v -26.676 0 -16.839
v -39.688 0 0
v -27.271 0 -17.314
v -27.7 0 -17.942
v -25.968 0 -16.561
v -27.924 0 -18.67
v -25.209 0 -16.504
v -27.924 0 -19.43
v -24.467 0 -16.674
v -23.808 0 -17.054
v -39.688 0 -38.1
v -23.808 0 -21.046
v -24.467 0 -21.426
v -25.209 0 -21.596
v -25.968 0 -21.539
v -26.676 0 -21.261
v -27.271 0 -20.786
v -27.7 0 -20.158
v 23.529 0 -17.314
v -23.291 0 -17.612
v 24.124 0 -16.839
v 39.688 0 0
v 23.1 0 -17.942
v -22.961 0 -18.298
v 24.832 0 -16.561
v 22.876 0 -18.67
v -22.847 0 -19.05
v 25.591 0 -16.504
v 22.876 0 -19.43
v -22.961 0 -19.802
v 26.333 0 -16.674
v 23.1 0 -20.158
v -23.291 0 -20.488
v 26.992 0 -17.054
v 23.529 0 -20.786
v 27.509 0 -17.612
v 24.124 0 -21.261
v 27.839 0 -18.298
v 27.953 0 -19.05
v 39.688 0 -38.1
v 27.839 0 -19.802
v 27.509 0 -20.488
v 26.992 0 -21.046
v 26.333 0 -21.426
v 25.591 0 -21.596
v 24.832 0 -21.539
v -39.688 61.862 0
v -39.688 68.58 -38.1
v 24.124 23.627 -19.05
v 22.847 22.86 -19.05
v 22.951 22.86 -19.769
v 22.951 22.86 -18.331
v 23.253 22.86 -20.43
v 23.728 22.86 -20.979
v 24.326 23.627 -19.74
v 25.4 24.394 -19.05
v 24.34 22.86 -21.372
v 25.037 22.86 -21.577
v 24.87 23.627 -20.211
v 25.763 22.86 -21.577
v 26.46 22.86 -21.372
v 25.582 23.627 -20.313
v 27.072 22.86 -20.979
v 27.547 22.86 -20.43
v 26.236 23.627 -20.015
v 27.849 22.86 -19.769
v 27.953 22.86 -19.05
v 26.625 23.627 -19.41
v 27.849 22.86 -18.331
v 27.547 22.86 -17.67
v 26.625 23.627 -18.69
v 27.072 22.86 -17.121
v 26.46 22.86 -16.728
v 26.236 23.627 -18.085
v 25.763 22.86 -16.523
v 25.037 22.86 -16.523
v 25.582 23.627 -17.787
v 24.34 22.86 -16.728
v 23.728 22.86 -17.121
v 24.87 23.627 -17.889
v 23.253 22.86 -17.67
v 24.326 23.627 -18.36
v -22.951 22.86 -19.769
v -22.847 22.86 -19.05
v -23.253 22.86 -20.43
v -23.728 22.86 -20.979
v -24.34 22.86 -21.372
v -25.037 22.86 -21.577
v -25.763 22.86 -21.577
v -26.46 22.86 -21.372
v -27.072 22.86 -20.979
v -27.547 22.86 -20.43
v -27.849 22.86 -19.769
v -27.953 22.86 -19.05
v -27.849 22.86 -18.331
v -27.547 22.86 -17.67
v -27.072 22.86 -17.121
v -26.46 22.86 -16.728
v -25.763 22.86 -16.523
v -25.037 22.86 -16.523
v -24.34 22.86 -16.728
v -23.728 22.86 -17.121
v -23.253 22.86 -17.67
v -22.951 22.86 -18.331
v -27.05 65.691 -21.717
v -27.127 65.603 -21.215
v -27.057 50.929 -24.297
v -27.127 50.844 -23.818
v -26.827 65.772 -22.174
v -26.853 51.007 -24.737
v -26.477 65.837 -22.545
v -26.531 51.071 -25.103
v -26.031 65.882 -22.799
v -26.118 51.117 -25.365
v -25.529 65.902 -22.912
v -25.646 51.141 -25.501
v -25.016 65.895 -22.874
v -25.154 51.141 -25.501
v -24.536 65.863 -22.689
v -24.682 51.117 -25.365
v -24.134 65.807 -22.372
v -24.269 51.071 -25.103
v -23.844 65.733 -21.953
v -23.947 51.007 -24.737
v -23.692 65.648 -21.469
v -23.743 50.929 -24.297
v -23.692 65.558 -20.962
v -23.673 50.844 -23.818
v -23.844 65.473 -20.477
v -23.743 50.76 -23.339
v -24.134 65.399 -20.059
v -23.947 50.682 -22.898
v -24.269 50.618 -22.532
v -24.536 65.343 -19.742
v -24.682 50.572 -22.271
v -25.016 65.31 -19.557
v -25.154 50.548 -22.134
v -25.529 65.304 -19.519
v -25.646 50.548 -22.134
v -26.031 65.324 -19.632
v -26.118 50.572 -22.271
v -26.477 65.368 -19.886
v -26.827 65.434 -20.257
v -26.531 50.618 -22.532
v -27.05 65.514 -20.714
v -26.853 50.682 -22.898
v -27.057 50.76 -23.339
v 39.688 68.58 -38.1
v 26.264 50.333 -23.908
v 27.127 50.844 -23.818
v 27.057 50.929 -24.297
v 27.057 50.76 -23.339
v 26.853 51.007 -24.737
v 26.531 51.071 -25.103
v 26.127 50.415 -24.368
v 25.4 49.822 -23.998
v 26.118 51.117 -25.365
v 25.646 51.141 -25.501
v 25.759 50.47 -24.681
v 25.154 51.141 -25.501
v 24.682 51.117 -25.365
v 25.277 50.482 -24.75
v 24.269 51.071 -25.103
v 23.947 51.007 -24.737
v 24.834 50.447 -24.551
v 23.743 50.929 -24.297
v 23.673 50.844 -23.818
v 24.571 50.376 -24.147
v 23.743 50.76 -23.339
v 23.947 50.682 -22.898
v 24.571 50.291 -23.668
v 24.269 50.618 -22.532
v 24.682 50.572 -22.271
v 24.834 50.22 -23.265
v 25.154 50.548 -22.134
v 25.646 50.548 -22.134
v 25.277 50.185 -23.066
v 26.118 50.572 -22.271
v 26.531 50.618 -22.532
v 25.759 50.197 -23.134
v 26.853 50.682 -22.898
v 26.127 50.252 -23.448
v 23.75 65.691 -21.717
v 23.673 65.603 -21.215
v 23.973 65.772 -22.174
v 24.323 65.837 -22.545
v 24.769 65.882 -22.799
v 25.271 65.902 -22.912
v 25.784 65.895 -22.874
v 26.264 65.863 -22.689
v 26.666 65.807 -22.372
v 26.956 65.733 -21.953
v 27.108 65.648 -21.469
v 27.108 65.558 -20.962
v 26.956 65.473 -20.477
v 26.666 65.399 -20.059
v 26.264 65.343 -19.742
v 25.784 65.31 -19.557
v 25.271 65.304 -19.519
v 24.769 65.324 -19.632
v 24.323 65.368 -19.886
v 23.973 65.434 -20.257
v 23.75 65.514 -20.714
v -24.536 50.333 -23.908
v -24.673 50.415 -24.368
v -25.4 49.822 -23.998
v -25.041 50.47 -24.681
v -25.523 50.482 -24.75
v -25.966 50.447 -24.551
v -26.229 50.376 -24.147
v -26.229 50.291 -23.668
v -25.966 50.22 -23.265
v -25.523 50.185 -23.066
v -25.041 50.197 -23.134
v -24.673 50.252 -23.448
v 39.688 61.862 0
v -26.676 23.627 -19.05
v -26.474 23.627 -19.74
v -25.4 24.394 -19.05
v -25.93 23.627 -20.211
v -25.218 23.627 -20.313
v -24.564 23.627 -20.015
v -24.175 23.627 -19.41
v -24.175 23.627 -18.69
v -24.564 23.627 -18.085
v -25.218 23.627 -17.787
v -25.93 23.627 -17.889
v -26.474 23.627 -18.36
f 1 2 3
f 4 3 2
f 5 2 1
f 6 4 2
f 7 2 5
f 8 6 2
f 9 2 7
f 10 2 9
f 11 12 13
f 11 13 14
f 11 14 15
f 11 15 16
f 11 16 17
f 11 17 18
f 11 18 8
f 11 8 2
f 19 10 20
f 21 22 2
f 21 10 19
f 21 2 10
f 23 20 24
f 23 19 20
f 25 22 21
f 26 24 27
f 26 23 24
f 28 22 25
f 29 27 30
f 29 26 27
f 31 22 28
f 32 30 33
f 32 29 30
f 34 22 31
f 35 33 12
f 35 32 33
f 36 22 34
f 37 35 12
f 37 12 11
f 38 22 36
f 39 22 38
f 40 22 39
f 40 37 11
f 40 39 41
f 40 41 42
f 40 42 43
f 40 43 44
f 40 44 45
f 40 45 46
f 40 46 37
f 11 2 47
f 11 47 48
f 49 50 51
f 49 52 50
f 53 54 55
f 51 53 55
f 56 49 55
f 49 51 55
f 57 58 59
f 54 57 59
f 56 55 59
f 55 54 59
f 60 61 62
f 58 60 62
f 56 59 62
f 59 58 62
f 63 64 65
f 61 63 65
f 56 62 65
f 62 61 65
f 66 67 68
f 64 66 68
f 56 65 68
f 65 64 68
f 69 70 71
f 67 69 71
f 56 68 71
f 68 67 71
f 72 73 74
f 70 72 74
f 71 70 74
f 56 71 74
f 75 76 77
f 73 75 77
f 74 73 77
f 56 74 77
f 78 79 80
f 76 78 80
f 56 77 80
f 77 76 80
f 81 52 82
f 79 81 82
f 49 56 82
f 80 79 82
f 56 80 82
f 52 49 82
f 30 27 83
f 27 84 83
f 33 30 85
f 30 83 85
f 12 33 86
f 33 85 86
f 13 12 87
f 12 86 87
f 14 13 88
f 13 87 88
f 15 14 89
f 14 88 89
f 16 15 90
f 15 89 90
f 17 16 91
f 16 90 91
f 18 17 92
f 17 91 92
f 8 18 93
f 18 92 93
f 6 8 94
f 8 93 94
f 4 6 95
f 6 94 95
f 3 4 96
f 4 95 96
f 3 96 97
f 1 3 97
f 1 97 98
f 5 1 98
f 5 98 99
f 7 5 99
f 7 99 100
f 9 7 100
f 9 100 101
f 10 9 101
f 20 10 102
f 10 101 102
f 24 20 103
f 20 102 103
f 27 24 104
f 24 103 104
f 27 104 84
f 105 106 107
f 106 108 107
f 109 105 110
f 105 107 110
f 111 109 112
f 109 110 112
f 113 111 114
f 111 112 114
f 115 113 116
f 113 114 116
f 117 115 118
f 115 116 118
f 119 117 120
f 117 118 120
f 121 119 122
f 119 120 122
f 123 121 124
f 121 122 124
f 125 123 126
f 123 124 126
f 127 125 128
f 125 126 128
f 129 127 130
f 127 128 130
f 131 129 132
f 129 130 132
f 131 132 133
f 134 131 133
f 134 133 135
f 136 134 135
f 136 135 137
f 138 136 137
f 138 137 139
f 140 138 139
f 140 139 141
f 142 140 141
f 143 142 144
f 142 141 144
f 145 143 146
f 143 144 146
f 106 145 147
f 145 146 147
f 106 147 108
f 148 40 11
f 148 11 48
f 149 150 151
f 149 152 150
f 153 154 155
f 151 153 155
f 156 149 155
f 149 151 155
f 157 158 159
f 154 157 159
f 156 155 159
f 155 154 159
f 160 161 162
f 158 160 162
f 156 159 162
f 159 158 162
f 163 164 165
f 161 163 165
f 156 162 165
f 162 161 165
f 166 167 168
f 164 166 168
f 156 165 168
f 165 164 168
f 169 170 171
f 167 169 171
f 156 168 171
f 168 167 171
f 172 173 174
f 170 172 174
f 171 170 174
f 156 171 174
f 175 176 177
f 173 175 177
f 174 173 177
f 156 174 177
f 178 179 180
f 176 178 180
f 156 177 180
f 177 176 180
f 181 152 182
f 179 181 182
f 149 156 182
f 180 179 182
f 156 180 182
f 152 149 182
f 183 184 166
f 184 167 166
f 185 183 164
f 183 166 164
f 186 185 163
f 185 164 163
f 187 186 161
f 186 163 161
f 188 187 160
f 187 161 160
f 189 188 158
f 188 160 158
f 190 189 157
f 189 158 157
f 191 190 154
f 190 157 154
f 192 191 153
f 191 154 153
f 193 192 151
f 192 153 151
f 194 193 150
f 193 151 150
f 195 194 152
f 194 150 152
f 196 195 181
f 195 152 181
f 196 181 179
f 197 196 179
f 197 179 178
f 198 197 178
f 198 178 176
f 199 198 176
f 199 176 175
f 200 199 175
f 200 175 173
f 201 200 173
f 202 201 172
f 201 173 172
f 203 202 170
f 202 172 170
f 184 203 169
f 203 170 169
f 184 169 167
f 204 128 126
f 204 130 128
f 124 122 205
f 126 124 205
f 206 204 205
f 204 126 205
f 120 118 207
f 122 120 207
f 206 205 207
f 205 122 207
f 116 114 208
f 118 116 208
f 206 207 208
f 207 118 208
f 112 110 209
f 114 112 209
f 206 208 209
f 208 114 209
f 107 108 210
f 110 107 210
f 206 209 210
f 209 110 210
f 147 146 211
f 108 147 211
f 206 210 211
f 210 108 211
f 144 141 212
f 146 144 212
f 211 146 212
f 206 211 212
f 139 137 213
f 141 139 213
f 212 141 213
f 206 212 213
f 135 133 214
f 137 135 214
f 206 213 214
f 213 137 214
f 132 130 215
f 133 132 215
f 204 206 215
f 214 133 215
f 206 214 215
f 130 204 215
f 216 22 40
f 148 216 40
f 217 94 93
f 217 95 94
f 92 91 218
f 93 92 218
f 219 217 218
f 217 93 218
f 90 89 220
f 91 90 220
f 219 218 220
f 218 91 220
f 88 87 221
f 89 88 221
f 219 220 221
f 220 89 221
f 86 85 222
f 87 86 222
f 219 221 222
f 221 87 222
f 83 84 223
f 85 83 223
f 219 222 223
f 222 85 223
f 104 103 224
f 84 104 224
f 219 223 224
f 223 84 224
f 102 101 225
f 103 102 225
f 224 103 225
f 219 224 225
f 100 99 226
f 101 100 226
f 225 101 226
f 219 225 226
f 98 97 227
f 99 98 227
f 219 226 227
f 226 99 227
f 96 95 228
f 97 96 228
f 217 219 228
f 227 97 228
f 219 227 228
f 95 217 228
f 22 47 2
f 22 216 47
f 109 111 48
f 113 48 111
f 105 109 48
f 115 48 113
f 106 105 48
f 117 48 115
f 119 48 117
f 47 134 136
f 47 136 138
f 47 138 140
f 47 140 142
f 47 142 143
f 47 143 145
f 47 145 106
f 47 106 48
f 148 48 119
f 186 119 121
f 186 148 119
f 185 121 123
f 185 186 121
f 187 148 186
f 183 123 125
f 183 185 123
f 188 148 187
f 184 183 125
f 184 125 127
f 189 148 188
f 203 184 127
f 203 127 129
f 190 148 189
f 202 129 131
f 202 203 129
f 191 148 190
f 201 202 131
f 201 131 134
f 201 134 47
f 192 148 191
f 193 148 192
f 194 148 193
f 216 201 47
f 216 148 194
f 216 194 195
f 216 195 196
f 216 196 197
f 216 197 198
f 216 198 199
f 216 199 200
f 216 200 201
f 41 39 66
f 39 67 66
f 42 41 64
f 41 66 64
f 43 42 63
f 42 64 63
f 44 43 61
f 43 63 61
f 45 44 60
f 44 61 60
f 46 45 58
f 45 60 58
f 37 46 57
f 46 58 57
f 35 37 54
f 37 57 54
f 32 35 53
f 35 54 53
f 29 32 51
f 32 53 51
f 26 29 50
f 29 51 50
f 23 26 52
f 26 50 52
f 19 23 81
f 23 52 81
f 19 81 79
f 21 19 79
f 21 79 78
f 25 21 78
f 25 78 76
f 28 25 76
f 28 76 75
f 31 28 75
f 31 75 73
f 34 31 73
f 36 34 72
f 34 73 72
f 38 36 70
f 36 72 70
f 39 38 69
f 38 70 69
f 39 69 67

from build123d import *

# Parameters (mm, degrees)
BOSS_EXTRUDE2_DEPTH         = 39.6875
F_1_4_20_TAPPED_HOLE1_D     = 5.1054
F_1_4_20_TAPPED_HOLE1_DEPTH = 22.86
F_1_4_20_TAPPED_HOLE1_TIP   = 1.533816902
F_8_32_TAPPED_HOLE1_D       = 3.4544
F_8_32_TAPPED_HOLE1_DEPTH   = 14.986
F_8_32_TAPPED_HOLE1_TIP     = 1.037806461


with BuildPart() as part:
    # Sketch3 → Boss-Extrude2 (new, symmetric)
    with BuildSketch(Plane(origin=(0, 0, 0), x_dir=(0, 0, -1), z_dir=(1, 0, 0))):
        Polygon((0, 0), (38.1, 0), (38.1, 68.58), (0, 61.861942035), align=None)
    extrude(amount=BOSS_EXTRUDE2_DEPTH, both=True)

    # 1/4-20 Tapped Hole1
    with Locations(Plane(origin=(0, 0, 0), x_dir=(-1, 0, 0), z_dir=(0, -1, 0))):
        with Locations((25.4, 19.05), (-25.4, 19.05)):
            Hole(F_1_4_20_TAPPED_HOLE1_D / 2, depth=F_1_4_20_TAPPED_HOLE1_DEPTH)
            with Locations((0, 0, -(F_1_4_20_TAPPED_HOLE1_DEPTH + F_1_4_20_TAPPED_HOLE1_TIP / 2))):  # 118° drill point
                Cone(0, F_1_4_20_TAPPED_HOLE1_D / 2, F_1_4_20_TAPPED_HOLE1_TIP, mode=Mode.SUBTRACT)

    # #8-32 Tapped Hole1
    with Locations(Plane(origin=(0, 59.996576236, 10.579015141), x_dir=(1, 0, 0), z_dir=(0, 0.9848077530122092, 0.17364817766692348))):
        with Locations((-25.4, 32.284967414), (25.4, 32.284967414)):
            Hole(F_8_32_TAPPED_HOLE1_D / 2, depth=F_8_32_TAPPED_HOLE1_DEPTH)
            with Locations((0, 0, -(F_8_32_TAPPED_HOLE1_DEPTH + F_8_32_TAPPED_HOLE1_TIP / 2))):  # 118° drill point
                Cone(0, F_8_32_TAPPED_HOLE1_D / 2, F_8_32_TAPPED_HOLE1_TIP, mode=Mode.SUBTRACT)


solid = part.part
